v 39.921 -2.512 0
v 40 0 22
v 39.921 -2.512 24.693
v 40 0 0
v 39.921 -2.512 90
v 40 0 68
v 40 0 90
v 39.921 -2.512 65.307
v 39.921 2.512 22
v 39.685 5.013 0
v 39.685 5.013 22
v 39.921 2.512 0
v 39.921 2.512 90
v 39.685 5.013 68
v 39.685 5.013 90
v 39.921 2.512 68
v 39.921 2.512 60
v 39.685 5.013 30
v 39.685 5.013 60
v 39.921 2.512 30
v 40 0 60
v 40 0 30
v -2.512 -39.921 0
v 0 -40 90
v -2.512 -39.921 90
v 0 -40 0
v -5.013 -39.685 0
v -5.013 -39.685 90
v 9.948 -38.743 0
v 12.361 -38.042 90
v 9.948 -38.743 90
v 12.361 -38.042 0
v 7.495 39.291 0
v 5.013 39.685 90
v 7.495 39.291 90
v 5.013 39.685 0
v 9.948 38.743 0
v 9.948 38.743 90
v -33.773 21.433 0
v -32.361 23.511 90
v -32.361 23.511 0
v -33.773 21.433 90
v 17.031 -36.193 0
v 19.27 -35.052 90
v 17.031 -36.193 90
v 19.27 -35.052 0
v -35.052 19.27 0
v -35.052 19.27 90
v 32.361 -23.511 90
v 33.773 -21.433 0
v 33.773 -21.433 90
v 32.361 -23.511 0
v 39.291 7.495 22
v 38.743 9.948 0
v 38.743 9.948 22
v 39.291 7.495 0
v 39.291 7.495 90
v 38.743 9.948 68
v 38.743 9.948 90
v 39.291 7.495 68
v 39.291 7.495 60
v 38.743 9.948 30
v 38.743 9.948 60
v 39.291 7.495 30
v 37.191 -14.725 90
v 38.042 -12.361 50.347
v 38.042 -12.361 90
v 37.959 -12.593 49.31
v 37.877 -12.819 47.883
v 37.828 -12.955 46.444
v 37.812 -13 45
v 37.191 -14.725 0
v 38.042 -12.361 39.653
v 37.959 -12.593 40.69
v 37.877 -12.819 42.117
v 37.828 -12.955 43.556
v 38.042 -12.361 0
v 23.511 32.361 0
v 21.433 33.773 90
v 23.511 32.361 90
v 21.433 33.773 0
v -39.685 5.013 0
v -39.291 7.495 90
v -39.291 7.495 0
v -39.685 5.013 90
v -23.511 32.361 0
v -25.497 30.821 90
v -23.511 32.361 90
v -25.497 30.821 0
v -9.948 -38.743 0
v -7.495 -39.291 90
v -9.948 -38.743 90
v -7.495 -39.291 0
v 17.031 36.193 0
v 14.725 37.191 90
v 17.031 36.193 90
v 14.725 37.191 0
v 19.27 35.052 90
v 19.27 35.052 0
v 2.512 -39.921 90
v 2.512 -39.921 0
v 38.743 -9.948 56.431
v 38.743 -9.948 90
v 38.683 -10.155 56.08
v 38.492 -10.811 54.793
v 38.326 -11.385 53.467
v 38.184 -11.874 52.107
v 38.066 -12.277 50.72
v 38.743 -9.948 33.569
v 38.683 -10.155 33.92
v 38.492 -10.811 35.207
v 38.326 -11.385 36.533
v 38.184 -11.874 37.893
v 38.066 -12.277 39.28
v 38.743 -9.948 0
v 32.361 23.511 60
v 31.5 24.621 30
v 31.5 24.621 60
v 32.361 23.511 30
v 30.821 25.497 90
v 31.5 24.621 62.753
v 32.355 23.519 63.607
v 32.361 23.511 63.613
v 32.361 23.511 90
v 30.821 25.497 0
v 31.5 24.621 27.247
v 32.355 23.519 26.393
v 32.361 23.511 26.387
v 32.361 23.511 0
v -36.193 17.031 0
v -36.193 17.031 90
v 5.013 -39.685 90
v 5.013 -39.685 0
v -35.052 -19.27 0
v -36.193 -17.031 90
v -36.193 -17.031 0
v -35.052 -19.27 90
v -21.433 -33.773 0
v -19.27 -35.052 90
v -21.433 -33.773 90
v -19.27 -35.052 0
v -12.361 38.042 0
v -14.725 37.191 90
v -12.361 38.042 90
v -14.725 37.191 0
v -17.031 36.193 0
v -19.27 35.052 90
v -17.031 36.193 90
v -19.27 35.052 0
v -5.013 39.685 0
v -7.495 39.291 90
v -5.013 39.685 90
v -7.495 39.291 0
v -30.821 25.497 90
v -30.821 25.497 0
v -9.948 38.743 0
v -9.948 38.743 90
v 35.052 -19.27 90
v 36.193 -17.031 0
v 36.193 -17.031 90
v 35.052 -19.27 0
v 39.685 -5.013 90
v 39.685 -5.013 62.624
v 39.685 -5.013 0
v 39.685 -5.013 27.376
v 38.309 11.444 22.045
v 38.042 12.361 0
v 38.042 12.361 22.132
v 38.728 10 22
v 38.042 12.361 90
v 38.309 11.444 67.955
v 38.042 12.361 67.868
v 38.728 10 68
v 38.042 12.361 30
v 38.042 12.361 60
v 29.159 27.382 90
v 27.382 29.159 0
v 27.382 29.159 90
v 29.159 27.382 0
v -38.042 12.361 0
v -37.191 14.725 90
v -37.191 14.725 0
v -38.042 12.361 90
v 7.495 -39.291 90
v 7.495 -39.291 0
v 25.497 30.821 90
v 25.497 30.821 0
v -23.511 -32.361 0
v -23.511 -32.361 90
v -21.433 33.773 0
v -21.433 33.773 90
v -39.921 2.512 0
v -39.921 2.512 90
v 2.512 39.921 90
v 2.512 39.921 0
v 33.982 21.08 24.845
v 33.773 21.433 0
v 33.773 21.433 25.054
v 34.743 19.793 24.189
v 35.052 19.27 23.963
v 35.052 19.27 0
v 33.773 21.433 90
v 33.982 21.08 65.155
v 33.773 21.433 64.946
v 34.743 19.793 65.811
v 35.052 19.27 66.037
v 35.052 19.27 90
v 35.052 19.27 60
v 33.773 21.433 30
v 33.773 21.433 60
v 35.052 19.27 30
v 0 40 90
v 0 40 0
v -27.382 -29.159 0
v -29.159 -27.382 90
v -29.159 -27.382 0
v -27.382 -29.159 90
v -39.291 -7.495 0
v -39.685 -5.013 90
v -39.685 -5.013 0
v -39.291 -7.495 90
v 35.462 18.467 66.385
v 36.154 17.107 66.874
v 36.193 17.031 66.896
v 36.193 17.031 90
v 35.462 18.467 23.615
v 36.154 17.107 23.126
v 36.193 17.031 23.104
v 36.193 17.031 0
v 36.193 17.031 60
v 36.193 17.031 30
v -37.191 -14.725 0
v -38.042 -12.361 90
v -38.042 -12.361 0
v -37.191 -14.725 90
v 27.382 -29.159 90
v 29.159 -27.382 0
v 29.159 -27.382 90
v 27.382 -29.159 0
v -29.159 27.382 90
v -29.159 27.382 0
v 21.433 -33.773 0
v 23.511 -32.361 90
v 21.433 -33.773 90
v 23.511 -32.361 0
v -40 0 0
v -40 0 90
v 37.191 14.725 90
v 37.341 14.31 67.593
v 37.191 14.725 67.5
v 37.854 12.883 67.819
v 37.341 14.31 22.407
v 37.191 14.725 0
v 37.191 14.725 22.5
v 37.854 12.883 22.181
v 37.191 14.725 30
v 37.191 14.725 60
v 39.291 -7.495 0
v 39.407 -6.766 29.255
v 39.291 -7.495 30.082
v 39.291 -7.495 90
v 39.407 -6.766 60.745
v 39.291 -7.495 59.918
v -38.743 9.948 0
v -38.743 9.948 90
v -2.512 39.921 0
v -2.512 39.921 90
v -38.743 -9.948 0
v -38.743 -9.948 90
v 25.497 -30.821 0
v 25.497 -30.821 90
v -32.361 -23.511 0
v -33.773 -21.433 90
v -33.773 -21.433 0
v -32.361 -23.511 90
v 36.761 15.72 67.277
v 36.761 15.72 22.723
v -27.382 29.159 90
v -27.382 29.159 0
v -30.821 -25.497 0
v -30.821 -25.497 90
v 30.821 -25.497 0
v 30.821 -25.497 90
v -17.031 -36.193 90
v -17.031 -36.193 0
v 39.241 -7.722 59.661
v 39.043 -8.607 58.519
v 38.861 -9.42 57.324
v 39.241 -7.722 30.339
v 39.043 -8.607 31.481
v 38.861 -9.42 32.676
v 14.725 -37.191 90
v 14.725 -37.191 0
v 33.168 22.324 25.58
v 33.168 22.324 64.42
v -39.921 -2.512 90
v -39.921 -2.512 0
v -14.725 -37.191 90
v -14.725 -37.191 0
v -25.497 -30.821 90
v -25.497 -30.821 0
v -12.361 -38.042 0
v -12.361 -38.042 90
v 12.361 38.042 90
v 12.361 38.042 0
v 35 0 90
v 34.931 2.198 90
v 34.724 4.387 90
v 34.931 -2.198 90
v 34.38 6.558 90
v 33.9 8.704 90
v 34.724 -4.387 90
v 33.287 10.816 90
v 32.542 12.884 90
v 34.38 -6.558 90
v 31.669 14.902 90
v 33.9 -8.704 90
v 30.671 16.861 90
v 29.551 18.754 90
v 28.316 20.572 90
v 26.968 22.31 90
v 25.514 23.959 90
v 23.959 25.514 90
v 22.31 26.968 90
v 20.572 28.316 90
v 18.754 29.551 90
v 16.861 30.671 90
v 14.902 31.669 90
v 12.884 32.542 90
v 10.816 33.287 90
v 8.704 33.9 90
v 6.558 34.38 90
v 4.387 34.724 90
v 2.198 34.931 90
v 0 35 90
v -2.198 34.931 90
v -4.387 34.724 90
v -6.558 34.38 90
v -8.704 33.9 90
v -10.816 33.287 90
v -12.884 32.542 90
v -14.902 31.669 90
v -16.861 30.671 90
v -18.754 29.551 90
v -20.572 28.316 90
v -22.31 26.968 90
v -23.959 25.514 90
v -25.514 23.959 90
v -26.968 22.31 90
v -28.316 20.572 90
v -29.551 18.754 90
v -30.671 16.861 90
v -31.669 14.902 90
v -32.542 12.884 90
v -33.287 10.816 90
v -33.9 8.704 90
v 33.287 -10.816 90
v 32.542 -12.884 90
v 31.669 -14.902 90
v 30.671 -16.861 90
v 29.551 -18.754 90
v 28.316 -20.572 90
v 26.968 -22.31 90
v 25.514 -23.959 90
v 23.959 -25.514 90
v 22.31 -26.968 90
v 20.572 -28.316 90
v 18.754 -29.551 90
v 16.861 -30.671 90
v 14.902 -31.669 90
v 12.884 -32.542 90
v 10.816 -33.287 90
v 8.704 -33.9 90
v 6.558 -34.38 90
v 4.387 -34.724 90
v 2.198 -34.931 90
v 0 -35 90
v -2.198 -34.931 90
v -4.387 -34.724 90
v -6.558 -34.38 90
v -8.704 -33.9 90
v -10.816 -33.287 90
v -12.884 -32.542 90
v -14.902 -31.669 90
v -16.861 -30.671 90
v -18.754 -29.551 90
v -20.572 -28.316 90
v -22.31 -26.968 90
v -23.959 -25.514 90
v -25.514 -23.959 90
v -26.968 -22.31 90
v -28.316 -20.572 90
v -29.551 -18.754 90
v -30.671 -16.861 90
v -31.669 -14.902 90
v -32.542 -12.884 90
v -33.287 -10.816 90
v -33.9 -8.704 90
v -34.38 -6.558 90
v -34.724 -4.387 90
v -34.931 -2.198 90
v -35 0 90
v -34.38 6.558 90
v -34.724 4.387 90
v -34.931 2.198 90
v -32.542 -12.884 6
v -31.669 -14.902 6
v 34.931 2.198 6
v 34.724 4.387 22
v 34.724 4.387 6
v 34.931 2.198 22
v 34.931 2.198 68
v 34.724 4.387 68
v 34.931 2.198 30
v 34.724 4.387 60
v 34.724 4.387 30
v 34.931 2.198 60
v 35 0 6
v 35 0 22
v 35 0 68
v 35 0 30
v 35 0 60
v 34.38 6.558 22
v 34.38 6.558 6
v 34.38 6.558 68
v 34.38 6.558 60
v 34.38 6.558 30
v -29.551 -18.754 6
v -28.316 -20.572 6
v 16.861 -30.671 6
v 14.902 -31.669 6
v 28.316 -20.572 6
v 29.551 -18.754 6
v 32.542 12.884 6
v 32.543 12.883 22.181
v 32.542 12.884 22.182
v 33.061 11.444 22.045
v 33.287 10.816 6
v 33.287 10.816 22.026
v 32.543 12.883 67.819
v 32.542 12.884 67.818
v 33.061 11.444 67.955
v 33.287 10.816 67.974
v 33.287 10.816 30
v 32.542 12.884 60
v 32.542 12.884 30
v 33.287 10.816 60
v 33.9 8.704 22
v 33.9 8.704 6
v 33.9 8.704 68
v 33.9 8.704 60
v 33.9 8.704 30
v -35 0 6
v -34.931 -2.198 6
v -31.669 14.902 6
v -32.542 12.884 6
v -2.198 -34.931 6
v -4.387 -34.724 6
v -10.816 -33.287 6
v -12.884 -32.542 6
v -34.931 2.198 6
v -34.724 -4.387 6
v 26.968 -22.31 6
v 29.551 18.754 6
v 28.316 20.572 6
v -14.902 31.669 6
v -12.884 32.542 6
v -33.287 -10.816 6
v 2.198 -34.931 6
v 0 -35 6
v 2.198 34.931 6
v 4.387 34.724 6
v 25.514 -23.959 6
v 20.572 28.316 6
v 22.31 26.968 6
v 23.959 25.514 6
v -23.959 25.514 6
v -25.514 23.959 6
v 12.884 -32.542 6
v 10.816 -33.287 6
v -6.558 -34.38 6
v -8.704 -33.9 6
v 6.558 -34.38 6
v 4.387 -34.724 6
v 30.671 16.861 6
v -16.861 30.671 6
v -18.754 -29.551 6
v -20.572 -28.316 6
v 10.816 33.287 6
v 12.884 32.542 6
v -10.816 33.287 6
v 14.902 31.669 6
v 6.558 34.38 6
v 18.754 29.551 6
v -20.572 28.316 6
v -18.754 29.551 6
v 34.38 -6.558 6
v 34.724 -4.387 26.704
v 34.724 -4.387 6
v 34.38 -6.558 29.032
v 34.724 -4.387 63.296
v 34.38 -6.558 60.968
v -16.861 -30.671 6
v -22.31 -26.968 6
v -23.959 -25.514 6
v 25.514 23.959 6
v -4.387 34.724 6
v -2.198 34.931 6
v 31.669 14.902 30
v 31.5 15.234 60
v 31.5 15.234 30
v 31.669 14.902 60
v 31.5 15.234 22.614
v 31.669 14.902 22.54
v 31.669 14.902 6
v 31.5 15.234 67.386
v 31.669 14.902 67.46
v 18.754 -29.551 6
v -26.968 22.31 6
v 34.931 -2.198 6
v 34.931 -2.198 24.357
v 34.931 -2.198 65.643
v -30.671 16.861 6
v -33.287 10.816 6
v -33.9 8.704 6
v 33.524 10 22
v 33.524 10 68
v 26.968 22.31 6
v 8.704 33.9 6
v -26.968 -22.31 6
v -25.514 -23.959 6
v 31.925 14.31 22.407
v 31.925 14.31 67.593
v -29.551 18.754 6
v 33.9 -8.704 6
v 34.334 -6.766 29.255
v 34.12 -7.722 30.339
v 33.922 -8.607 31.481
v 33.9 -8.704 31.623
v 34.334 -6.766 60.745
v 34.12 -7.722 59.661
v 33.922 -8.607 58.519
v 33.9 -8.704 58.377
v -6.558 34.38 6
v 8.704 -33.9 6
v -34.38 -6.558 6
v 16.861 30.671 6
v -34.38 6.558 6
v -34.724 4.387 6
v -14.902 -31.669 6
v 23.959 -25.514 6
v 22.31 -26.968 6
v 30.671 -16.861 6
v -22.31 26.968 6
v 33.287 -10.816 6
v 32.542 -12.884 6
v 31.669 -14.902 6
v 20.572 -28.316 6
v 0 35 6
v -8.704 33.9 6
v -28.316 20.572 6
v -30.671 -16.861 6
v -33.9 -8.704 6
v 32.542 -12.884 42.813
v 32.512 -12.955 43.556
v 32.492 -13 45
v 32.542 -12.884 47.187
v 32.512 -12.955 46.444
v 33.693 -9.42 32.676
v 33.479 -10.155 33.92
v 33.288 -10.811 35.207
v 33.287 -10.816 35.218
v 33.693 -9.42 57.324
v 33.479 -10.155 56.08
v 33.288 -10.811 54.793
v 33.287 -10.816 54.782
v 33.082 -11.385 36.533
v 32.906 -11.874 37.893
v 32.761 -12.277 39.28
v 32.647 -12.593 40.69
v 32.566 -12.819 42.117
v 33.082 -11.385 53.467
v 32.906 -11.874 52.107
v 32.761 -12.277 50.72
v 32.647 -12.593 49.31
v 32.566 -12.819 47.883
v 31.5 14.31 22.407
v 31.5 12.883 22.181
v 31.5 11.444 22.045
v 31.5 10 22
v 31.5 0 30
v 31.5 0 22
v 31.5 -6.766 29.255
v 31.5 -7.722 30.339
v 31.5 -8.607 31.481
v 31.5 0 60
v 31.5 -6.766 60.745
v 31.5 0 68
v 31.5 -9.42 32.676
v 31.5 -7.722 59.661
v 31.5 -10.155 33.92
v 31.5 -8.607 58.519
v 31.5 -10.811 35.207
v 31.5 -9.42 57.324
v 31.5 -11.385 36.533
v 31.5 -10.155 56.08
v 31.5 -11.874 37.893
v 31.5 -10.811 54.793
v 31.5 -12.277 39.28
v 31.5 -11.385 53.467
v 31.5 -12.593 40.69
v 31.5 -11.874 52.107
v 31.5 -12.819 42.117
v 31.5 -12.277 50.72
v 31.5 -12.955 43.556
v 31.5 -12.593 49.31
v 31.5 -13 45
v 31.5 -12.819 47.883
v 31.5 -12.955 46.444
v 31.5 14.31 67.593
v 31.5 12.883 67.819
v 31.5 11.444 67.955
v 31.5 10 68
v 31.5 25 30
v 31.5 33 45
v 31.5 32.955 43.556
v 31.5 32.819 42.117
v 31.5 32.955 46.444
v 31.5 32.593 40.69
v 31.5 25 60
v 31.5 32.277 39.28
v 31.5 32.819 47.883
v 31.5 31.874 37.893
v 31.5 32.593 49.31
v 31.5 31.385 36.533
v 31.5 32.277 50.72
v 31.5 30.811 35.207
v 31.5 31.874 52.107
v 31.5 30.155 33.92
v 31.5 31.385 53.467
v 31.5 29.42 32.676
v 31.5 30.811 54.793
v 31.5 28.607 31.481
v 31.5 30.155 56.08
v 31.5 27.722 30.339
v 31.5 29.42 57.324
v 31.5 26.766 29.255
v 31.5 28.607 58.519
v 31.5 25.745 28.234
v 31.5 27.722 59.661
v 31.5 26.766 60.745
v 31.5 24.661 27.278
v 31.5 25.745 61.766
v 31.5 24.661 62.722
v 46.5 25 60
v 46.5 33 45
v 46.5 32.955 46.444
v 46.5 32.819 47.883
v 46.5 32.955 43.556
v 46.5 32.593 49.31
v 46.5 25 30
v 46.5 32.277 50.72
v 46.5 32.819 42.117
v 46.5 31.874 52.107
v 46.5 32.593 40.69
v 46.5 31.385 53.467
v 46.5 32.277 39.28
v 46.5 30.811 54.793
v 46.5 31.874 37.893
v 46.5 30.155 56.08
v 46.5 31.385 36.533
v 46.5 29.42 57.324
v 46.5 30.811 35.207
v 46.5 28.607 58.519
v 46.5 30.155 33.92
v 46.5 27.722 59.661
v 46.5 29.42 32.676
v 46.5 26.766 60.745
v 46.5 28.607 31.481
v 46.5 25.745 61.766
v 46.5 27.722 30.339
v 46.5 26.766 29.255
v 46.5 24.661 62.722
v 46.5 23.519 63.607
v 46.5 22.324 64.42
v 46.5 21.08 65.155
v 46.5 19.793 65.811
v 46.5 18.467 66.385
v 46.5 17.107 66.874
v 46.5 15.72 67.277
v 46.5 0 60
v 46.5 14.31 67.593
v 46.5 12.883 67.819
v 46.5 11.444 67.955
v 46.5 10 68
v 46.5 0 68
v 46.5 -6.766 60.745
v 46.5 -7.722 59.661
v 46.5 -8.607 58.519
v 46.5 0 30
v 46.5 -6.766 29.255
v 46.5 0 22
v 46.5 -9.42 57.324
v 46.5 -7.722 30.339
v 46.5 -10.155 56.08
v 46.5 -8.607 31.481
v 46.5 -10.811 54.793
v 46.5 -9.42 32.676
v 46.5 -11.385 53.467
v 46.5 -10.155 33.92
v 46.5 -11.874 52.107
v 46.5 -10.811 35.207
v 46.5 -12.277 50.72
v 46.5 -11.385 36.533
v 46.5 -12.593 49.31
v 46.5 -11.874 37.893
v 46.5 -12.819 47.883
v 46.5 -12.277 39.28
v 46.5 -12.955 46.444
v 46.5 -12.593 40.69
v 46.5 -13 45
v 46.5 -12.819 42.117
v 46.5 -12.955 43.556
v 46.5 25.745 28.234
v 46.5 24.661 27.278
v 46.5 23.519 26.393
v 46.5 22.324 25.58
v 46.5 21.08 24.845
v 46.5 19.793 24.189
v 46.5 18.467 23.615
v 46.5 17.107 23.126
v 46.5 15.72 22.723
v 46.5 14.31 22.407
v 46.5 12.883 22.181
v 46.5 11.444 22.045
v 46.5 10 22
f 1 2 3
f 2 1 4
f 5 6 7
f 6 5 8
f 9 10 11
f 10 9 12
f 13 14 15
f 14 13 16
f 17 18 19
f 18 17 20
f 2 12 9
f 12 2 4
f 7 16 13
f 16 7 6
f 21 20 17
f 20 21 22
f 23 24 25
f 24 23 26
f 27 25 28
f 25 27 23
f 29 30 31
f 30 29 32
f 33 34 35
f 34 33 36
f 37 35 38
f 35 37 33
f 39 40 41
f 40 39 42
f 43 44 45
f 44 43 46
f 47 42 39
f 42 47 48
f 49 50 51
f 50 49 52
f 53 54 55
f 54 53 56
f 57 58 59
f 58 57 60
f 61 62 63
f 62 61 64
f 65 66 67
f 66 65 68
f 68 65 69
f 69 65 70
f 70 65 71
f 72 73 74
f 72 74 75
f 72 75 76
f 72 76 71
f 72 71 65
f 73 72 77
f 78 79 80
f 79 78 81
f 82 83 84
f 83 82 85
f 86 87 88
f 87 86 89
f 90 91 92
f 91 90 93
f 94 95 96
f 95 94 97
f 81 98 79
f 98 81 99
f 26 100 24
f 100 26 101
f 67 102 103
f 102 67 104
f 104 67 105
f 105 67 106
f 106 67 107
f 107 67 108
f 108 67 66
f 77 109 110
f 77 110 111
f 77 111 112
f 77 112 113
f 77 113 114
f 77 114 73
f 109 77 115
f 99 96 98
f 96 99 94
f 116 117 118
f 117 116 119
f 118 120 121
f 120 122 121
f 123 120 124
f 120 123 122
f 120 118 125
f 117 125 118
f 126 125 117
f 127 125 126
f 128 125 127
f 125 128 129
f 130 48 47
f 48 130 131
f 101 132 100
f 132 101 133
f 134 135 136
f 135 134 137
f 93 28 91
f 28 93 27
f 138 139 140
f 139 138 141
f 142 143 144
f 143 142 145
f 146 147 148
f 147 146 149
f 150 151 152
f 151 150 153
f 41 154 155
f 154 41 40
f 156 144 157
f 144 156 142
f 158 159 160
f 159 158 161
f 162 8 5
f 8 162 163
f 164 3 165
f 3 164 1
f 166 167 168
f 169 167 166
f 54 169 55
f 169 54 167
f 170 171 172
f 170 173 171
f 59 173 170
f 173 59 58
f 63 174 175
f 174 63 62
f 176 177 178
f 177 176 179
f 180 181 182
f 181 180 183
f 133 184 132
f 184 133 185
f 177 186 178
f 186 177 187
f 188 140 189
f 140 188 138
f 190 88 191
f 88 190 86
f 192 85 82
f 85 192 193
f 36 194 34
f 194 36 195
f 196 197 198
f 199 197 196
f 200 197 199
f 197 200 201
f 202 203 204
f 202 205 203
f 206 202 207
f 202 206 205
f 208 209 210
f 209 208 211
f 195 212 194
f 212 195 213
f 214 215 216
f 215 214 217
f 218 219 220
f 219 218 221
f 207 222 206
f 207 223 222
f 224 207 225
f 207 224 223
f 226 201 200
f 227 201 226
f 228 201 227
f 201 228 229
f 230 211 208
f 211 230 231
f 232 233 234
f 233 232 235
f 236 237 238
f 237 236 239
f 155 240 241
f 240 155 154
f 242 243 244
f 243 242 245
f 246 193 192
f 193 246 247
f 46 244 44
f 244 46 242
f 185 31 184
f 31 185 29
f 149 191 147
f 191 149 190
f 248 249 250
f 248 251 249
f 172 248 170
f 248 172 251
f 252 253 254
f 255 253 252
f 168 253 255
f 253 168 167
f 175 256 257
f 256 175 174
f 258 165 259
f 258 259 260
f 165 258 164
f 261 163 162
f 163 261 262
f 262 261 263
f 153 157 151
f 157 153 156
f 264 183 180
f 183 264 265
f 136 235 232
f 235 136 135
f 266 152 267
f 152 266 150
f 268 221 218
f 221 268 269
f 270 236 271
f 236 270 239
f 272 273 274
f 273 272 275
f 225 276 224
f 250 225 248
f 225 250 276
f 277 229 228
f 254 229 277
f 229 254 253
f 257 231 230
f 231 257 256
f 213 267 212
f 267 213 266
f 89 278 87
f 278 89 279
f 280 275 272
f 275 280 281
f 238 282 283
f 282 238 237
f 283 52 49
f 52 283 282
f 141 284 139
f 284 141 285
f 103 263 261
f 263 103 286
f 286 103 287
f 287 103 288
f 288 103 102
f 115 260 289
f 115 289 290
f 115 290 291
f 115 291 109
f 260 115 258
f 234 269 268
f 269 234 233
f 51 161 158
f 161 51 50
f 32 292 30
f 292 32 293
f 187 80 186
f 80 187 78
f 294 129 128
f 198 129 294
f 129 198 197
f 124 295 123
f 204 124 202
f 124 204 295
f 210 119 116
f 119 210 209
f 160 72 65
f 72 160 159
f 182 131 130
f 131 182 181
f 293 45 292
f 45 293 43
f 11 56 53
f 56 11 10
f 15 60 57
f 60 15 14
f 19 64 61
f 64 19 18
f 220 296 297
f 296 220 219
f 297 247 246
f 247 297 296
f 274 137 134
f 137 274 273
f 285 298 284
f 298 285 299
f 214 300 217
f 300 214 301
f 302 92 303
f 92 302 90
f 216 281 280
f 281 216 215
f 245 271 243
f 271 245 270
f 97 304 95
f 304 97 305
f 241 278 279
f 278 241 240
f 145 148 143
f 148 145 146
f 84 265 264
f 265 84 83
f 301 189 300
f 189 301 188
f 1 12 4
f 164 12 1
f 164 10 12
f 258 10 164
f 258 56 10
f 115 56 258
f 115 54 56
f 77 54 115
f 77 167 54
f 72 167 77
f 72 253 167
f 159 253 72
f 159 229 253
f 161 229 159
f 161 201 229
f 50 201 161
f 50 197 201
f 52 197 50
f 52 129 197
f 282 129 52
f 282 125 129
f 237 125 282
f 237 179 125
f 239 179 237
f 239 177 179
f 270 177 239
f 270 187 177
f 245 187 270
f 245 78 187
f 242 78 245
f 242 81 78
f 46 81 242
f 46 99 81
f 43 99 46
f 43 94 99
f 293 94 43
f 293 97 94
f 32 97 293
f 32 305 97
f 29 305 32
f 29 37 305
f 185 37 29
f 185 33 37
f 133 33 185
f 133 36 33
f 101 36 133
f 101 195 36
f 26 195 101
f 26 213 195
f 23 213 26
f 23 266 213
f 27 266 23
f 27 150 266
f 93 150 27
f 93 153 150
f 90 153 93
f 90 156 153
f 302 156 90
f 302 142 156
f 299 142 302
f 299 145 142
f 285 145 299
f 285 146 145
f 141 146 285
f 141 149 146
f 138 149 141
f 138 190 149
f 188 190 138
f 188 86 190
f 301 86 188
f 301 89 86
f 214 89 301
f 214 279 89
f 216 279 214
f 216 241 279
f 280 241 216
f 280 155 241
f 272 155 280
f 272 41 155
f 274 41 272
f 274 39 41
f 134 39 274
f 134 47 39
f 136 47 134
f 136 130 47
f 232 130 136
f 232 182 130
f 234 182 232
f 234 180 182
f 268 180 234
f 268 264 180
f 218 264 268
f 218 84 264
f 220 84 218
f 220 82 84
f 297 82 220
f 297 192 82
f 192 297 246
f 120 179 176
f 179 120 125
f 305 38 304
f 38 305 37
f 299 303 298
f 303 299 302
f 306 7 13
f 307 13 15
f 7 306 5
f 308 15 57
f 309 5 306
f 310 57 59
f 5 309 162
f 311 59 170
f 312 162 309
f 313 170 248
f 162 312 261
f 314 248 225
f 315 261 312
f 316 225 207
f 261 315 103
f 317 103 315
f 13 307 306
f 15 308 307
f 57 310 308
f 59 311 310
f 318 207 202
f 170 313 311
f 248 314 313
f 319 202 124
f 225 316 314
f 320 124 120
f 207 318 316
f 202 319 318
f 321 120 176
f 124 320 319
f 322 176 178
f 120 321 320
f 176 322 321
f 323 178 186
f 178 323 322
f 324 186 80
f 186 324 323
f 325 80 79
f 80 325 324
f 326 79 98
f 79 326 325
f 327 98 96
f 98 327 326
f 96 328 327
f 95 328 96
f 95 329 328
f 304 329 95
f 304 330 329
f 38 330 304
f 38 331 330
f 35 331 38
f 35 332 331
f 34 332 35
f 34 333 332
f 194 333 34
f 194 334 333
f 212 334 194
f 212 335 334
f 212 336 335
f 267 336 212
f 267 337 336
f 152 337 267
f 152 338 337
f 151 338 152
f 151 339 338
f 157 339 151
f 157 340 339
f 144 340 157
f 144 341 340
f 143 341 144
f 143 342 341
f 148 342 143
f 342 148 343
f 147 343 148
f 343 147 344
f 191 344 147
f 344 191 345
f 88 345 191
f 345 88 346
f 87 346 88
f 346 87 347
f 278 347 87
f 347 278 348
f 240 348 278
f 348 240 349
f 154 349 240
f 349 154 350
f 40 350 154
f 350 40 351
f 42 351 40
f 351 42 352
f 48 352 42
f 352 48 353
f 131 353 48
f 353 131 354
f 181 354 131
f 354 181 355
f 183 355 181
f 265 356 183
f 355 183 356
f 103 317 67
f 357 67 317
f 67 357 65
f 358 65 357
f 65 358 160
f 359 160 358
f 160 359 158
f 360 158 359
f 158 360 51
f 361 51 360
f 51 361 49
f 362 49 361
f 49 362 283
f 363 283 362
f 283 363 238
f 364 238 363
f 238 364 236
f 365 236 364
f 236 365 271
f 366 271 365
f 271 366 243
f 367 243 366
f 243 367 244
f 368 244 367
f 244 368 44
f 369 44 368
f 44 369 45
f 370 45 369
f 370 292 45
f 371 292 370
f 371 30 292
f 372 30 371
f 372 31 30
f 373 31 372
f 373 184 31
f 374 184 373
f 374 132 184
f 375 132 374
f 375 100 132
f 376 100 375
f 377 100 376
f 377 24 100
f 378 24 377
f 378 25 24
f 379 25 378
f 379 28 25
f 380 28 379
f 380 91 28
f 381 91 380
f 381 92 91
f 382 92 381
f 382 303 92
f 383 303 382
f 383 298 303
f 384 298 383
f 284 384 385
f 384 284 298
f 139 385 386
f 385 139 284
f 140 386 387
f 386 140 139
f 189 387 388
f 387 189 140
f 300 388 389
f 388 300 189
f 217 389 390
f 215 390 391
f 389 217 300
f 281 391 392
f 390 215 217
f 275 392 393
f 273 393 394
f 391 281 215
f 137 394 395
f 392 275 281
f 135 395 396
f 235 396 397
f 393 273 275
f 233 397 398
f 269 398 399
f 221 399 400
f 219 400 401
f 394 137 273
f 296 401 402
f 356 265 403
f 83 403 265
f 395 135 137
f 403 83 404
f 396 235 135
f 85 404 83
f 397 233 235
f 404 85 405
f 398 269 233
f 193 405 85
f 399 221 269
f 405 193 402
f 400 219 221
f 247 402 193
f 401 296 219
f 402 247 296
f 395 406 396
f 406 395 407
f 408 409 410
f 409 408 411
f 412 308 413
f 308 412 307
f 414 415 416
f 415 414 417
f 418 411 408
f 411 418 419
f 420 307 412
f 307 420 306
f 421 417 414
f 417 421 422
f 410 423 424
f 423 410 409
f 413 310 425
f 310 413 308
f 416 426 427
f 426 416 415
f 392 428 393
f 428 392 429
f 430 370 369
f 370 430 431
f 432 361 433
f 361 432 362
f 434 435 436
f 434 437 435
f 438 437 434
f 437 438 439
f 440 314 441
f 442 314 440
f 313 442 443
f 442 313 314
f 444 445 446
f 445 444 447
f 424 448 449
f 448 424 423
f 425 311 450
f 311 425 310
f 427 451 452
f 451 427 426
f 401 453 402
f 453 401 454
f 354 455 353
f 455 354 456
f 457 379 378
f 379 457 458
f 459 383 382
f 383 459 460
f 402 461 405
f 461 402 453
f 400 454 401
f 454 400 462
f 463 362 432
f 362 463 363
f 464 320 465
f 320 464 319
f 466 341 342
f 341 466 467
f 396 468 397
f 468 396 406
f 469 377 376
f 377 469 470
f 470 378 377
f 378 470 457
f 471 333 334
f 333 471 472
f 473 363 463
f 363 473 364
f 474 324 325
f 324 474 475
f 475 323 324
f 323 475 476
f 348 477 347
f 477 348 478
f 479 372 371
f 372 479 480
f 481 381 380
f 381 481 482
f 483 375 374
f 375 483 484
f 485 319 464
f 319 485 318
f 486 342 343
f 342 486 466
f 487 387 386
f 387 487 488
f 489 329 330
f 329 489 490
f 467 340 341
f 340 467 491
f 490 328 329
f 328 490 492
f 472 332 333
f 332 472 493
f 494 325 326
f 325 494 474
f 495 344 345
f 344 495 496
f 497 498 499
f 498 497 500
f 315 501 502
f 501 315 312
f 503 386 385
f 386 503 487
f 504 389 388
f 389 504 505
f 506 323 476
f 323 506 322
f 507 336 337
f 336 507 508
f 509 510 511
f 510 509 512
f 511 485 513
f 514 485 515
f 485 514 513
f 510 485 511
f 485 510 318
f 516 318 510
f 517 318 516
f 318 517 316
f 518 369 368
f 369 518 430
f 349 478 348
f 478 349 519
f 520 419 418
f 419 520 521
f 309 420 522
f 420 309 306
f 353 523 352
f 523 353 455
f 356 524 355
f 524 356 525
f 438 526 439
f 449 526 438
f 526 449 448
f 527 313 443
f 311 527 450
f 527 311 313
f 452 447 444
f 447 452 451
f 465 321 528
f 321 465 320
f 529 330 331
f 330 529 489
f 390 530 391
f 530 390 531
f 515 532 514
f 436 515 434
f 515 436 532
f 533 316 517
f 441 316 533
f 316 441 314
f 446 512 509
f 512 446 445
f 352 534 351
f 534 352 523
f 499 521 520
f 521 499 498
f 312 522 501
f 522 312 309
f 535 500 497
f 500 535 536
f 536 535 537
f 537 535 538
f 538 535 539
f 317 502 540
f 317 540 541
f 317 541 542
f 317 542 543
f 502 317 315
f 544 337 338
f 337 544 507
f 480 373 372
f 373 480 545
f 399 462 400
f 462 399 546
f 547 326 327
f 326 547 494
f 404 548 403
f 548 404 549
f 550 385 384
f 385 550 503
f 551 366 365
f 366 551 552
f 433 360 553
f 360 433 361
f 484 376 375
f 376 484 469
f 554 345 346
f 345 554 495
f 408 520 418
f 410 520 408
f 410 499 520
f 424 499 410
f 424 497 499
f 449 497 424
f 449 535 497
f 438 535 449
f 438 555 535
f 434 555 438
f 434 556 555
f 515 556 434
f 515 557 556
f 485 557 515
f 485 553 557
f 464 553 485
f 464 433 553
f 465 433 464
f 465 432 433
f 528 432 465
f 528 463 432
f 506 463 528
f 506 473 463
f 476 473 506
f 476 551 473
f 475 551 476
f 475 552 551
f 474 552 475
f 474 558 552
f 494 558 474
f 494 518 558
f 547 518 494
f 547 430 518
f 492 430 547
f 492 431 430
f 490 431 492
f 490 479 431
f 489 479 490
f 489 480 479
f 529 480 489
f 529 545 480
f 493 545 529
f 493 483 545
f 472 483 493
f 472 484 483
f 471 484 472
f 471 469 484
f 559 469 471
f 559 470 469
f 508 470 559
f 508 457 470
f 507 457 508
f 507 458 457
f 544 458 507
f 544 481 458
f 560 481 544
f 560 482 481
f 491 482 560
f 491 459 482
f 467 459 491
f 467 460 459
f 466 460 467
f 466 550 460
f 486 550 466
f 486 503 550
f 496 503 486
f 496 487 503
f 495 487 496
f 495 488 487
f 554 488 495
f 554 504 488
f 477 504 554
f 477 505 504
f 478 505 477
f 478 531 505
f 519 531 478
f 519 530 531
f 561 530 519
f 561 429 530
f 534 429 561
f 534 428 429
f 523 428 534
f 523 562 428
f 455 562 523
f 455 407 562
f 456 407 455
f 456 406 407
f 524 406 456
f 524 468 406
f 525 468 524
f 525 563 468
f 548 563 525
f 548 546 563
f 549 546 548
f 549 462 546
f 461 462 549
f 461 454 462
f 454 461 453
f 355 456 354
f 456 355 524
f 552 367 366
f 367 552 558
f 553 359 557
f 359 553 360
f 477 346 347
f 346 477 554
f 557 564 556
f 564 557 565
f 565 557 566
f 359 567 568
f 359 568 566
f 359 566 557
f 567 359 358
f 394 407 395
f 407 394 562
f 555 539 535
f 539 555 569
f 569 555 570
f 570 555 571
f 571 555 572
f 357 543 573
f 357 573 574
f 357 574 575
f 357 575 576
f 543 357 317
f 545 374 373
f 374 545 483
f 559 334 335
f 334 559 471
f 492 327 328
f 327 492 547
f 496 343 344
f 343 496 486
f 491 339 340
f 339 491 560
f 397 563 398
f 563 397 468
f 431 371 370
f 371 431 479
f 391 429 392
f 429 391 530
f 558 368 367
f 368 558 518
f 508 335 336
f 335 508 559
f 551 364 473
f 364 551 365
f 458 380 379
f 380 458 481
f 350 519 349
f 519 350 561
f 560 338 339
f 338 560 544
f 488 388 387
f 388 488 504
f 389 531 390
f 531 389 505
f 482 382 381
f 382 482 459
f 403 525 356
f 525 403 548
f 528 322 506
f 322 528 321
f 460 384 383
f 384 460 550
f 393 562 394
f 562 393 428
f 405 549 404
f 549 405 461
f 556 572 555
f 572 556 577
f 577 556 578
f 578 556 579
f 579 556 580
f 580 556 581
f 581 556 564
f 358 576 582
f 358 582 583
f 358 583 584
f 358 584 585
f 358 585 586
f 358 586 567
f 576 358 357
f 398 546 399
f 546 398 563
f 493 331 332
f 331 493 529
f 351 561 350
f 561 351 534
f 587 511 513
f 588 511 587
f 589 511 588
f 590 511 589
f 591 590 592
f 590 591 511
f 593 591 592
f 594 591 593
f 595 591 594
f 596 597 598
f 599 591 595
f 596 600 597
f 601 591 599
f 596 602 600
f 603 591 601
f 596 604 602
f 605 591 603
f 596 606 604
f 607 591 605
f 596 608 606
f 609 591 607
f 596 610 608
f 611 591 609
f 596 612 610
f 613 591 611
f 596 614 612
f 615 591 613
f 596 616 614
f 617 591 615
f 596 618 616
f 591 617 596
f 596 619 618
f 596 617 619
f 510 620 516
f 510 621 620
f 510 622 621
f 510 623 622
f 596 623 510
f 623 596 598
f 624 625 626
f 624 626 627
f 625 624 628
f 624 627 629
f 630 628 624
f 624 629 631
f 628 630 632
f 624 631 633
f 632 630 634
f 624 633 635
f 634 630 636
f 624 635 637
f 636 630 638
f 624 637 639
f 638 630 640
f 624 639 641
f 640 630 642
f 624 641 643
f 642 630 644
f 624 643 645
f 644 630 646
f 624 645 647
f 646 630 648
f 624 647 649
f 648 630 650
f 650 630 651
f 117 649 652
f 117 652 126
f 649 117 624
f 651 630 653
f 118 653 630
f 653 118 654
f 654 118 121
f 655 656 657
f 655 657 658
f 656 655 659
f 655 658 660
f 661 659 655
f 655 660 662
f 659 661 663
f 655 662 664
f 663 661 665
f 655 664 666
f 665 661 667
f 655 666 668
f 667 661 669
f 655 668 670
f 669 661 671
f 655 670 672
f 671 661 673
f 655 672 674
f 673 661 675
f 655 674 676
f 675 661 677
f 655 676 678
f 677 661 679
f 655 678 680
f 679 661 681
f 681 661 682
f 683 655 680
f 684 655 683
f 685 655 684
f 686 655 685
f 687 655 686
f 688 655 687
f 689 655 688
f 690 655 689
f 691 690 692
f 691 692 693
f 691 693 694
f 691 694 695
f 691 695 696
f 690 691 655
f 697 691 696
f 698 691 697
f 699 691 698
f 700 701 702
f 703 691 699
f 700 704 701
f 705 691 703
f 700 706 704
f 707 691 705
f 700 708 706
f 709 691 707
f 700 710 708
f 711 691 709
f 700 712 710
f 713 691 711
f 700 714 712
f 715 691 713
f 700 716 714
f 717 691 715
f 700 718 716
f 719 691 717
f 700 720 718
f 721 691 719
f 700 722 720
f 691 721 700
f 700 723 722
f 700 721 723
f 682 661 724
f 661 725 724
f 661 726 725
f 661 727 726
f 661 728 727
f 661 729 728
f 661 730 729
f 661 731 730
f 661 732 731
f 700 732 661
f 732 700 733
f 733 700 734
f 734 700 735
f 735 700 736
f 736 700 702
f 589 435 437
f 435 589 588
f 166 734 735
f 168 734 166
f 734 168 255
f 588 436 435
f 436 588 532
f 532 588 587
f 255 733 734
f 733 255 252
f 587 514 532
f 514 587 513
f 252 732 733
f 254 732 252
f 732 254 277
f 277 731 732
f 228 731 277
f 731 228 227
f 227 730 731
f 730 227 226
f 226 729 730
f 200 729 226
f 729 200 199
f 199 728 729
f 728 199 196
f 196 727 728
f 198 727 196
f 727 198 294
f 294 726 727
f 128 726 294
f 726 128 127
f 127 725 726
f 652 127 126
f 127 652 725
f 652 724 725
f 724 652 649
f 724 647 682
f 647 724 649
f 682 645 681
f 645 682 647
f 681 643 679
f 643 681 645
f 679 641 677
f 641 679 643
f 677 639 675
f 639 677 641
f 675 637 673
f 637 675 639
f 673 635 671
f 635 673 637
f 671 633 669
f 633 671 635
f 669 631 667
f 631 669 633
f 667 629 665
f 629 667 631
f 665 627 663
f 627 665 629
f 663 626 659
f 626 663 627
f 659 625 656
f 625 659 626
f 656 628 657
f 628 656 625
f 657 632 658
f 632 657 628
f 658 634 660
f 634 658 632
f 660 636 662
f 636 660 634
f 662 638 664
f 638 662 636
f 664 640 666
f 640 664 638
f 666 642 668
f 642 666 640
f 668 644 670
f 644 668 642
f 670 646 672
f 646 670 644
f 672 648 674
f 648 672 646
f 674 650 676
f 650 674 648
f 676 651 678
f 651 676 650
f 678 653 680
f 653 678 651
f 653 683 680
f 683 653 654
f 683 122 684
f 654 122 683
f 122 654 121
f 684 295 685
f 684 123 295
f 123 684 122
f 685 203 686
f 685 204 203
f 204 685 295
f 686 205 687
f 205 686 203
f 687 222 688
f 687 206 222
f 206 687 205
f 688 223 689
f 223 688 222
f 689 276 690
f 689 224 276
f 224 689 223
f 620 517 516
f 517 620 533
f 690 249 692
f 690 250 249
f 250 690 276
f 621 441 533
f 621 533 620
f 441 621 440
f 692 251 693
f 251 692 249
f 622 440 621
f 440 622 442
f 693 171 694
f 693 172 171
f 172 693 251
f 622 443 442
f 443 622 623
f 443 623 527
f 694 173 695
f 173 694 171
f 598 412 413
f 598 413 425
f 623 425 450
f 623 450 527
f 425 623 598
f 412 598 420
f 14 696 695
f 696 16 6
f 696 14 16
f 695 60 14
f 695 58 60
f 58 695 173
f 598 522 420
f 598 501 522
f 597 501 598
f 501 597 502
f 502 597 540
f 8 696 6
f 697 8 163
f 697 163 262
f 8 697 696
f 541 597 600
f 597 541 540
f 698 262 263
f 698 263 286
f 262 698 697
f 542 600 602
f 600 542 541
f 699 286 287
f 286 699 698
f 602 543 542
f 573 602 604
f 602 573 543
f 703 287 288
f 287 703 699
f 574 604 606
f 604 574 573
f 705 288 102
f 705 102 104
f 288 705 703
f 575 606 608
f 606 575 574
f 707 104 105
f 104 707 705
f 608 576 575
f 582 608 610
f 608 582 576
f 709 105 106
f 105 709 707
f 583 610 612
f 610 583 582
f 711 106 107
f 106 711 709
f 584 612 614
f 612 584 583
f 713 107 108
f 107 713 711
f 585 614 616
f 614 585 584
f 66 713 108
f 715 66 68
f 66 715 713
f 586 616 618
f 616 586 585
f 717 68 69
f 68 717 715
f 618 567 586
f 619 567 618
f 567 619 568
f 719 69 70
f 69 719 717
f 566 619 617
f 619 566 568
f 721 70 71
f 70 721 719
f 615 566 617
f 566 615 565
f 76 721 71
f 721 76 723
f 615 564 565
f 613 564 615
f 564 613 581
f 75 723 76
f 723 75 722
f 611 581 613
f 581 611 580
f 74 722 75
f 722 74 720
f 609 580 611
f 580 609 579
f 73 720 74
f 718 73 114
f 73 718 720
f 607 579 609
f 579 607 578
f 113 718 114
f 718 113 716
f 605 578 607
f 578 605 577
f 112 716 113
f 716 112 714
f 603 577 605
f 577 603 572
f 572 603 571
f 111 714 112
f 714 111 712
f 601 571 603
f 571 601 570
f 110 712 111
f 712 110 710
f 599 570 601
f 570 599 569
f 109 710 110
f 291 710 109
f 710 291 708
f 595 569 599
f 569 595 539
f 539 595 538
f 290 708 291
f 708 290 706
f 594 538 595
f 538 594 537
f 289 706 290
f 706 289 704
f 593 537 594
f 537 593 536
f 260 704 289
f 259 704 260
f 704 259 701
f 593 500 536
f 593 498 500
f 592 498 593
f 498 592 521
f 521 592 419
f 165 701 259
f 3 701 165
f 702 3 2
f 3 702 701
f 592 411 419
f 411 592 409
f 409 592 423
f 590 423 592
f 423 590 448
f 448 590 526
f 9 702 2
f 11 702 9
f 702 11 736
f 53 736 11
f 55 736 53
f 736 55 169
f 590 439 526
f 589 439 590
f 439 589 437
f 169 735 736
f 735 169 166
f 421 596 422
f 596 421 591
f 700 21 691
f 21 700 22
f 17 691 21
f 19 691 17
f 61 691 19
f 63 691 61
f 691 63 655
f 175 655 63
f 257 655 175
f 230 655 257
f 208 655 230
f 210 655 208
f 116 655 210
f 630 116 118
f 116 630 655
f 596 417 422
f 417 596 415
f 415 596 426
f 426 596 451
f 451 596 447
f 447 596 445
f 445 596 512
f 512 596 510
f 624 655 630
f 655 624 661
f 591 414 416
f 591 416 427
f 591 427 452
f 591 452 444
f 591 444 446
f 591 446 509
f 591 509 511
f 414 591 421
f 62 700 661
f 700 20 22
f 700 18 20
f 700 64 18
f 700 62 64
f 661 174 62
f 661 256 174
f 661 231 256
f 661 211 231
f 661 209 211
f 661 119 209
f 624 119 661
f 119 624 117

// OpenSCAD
$fn = 100;

// --- 寸法定義 ---
mug_outer_diam = 80;
mug_inner_diam = 70; // 肉厚 5mm
mug_height = 90;
mug_bottom_thick = 6;

handle_inner_w = 25;    // 取手内側の空間 幅
handle_inner_h = 30;    // 取手内側の空間 高さ
handle_thickness = 8;   // 取手の構造材の厚み
handle_breadth = 15;    // 取手の横幅(Y軸方向の厚み)

// 外側の高さ = 内側高さ + 上下の肉厚
handle_outer_h = handle_inner_h + (handle_thickness * 2);
// 外側の半径 = 外側高さの半分
handle_outer_r = handle_outer_h / 2;

union() {
    // 1. マグカップ本体
    difference() {
        // 外郭
        cylinder(h=mug_height, d=mug_outer_diam);
        
        // 内側の中空化
        translate([0, 0, mug_bottom_thick])
            cylinder(h=mug_height, d=mug_inner_diam);
    }

    // 2. 取手 (Handle) - +X軸方向に配置
    // 本体外周(x = 40)に接続。確実に結合させるため1mm食い込ませる。
    translate([(mug_outer_diam / 2) - 1, 0, mug_height / 2])
    rotate([90, 0, 90]) // 2D形状を垂直に立ててX軸方向に押し出し
    linear_extrude(height=handle_breadth, center=true) {
        difference() {
            // 取手の外形: D字形状 (本体側が直線、外側が半円)
            hull() {
                // 本体側の接合面
                translate([0, -handle_outer_h / 2])
                    square([1, handle_outer_h]);
                
                // 外側の半円部分
                // 全体の幅が (内側幅 + 肉厚) になるように配置
                translate([(handle_inner_w + handle_thickness) - handle_outer_r, 0])
                    circle(r = handle_outer_r);
            }
            
            // 取手の内側の穴 (高さ 30mm × 幅 25mm)
            translate([0, -handle_inner_h / 2])
                square([handle_inner_w, handle_inner_h]);
        }
    }
}
